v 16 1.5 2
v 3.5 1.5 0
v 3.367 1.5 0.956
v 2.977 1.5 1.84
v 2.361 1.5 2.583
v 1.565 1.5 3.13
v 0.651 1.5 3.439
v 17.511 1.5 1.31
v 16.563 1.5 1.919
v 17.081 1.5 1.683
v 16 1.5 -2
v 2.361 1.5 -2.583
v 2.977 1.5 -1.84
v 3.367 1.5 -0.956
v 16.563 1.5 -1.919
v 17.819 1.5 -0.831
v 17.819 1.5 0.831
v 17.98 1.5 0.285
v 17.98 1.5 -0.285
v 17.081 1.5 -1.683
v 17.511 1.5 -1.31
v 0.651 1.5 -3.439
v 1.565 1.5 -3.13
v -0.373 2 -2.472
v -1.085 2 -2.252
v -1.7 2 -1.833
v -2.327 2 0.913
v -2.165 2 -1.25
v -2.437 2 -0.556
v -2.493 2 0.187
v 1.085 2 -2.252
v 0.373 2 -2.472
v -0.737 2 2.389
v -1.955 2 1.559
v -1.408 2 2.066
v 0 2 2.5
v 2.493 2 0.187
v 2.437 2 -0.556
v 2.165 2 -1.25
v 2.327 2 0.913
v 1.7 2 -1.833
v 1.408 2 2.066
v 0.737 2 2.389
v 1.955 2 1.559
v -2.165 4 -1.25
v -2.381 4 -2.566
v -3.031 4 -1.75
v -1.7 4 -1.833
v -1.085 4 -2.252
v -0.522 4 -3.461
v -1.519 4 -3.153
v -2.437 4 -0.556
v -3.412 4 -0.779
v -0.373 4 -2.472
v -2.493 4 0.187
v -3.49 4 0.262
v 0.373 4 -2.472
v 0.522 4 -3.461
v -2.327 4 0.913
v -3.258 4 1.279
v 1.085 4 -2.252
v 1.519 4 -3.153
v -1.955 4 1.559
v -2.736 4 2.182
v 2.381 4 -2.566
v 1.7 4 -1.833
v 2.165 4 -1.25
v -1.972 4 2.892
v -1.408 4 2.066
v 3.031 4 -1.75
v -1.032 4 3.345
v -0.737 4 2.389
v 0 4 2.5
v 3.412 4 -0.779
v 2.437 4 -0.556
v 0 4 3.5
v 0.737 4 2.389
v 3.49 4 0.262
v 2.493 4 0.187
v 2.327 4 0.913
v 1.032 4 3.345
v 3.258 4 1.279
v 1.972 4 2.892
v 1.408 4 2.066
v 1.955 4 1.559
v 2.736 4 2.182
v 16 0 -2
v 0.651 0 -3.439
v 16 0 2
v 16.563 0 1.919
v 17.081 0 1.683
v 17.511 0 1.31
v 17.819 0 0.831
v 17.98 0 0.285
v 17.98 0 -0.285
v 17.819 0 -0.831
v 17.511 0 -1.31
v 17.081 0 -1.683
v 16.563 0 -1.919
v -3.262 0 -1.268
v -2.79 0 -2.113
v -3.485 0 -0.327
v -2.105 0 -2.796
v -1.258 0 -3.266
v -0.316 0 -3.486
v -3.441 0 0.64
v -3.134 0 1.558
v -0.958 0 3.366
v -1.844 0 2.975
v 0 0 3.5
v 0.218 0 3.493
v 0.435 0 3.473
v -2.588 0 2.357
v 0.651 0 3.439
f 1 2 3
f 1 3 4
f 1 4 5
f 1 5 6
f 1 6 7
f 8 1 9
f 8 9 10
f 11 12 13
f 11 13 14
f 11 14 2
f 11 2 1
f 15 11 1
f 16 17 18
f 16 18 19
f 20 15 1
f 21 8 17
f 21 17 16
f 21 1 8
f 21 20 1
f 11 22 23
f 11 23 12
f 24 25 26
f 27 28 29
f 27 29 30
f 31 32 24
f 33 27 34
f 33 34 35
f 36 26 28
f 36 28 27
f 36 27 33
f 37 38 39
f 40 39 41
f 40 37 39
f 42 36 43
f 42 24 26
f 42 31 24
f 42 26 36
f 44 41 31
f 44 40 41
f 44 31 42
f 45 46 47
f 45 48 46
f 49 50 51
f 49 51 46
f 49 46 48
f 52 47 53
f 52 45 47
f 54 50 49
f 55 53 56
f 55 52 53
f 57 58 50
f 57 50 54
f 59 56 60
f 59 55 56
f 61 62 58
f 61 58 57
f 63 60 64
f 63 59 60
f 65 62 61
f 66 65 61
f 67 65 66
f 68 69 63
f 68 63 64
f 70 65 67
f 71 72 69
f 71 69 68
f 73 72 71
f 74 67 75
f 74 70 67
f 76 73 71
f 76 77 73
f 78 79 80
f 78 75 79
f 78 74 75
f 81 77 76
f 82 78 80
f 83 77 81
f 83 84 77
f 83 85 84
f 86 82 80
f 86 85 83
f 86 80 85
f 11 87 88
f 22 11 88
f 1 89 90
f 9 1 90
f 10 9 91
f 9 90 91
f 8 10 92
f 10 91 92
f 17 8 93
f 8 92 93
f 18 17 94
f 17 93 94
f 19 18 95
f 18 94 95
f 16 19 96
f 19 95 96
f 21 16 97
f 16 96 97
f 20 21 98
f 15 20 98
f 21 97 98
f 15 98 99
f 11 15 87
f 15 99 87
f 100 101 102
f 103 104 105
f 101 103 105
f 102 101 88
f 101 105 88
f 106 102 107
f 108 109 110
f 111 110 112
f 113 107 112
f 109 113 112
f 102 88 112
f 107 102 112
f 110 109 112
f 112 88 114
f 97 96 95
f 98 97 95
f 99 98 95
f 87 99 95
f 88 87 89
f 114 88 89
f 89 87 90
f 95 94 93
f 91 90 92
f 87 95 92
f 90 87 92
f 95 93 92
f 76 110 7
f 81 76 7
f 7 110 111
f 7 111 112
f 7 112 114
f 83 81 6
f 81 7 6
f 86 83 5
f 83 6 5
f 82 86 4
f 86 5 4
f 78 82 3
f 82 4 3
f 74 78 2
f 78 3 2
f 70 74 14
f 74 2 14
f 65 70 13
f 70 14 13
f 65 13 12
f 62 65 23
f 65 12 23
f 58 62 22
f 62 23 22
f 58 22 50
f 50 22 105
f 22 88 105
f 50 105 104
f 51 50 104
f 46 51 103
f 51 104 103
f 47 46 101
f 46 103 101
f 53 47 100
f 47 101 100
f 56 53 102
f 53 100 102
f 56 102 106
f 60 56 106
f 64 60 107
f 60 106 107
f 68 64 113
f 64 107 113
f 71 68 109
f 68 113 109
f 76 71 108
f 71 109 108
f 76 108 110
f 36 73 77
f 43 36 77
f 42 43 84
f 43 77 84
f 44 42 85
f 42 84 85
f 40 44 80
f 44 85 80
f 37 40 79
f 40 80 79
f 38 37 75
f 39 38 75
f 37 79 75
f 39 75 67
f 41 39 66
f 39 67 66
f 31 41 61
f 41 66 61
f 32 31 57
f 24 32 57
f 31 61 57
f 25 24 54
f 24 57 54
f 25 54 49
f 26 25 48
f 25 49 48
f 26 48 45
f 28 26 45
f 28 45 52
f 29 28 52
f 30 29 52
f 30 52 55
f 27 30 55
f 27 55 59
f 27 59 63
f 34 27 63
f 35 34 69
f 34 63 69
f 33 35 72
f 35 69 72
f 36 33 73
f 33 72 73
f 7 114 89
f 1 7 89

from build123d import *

# Parameters (mm, degrees)
SKETCH1_R           = 3.5
BOSS_EXTRUDE1_DEPTH = 4
SKETCH2_R           = 2.5
CUT_EXTRUDE1_DEPTH  = 2
SKETCH3_R           = 2
BOSS_EXTRUDE2_DEPTH = 1.5


with BuildPart() as part:
    # Sketch1 → Boss-Extrude1 (new body)
    with BuildSketch(Plane(origin=(0, 0, 0), x_dir=(1, 0, 0), z_dir=(0, 1, 0))):
        with Locations(Location((0, 0, 0), (0, 0, 270))):
            Circle(SKETCH1_R)
    extrude(amount=BOSS_EXTRUDE1_DEPTH)

    # Sketch2 → Cut-Extrude1 (cut)
    with BuildSketch(Plane(origin=(0, 4, 0), x_dir=(1, 0, 0), z_dir=(0, 1, 0))):
        with Locations(Location((0, 0, 0), (0, 0, 270))):
            Circle(SKETCH2_R)
    extrude(amount=-CUT_EXTRUDE1_DEPTH, mode=Mode.SUBTRACT)

    # Sketch3 → Boss-Extrude2 (add)
    with BuildSketch(Plane(origin=(0, 0, 0), x_dir=(1, 0, 0), z_dir=(0, 1, 0))):
        with Locations((16, 0)):
            Circle(SKETCH3_R)
        with BuildLine():
            Line((16, 2), (0.65053243, 3.439012585))
            ThreePointArc((0.65053243, 3.439012585), (2.695075463, 2.233062527), (3.5, 0))
            ThreePointArc((3.5, 0), (2.695075463, -2.233062527), (0.65053243, -3.439012585))
            Line((0.65053243, -3.439012585), (16, -2))
            ThreePointArc((16, -2), (14, 0), (16, 2))
        make_face()
    extrude(amount=BOSS_EXTRUDE2_DEPTH)


solid = part.part
